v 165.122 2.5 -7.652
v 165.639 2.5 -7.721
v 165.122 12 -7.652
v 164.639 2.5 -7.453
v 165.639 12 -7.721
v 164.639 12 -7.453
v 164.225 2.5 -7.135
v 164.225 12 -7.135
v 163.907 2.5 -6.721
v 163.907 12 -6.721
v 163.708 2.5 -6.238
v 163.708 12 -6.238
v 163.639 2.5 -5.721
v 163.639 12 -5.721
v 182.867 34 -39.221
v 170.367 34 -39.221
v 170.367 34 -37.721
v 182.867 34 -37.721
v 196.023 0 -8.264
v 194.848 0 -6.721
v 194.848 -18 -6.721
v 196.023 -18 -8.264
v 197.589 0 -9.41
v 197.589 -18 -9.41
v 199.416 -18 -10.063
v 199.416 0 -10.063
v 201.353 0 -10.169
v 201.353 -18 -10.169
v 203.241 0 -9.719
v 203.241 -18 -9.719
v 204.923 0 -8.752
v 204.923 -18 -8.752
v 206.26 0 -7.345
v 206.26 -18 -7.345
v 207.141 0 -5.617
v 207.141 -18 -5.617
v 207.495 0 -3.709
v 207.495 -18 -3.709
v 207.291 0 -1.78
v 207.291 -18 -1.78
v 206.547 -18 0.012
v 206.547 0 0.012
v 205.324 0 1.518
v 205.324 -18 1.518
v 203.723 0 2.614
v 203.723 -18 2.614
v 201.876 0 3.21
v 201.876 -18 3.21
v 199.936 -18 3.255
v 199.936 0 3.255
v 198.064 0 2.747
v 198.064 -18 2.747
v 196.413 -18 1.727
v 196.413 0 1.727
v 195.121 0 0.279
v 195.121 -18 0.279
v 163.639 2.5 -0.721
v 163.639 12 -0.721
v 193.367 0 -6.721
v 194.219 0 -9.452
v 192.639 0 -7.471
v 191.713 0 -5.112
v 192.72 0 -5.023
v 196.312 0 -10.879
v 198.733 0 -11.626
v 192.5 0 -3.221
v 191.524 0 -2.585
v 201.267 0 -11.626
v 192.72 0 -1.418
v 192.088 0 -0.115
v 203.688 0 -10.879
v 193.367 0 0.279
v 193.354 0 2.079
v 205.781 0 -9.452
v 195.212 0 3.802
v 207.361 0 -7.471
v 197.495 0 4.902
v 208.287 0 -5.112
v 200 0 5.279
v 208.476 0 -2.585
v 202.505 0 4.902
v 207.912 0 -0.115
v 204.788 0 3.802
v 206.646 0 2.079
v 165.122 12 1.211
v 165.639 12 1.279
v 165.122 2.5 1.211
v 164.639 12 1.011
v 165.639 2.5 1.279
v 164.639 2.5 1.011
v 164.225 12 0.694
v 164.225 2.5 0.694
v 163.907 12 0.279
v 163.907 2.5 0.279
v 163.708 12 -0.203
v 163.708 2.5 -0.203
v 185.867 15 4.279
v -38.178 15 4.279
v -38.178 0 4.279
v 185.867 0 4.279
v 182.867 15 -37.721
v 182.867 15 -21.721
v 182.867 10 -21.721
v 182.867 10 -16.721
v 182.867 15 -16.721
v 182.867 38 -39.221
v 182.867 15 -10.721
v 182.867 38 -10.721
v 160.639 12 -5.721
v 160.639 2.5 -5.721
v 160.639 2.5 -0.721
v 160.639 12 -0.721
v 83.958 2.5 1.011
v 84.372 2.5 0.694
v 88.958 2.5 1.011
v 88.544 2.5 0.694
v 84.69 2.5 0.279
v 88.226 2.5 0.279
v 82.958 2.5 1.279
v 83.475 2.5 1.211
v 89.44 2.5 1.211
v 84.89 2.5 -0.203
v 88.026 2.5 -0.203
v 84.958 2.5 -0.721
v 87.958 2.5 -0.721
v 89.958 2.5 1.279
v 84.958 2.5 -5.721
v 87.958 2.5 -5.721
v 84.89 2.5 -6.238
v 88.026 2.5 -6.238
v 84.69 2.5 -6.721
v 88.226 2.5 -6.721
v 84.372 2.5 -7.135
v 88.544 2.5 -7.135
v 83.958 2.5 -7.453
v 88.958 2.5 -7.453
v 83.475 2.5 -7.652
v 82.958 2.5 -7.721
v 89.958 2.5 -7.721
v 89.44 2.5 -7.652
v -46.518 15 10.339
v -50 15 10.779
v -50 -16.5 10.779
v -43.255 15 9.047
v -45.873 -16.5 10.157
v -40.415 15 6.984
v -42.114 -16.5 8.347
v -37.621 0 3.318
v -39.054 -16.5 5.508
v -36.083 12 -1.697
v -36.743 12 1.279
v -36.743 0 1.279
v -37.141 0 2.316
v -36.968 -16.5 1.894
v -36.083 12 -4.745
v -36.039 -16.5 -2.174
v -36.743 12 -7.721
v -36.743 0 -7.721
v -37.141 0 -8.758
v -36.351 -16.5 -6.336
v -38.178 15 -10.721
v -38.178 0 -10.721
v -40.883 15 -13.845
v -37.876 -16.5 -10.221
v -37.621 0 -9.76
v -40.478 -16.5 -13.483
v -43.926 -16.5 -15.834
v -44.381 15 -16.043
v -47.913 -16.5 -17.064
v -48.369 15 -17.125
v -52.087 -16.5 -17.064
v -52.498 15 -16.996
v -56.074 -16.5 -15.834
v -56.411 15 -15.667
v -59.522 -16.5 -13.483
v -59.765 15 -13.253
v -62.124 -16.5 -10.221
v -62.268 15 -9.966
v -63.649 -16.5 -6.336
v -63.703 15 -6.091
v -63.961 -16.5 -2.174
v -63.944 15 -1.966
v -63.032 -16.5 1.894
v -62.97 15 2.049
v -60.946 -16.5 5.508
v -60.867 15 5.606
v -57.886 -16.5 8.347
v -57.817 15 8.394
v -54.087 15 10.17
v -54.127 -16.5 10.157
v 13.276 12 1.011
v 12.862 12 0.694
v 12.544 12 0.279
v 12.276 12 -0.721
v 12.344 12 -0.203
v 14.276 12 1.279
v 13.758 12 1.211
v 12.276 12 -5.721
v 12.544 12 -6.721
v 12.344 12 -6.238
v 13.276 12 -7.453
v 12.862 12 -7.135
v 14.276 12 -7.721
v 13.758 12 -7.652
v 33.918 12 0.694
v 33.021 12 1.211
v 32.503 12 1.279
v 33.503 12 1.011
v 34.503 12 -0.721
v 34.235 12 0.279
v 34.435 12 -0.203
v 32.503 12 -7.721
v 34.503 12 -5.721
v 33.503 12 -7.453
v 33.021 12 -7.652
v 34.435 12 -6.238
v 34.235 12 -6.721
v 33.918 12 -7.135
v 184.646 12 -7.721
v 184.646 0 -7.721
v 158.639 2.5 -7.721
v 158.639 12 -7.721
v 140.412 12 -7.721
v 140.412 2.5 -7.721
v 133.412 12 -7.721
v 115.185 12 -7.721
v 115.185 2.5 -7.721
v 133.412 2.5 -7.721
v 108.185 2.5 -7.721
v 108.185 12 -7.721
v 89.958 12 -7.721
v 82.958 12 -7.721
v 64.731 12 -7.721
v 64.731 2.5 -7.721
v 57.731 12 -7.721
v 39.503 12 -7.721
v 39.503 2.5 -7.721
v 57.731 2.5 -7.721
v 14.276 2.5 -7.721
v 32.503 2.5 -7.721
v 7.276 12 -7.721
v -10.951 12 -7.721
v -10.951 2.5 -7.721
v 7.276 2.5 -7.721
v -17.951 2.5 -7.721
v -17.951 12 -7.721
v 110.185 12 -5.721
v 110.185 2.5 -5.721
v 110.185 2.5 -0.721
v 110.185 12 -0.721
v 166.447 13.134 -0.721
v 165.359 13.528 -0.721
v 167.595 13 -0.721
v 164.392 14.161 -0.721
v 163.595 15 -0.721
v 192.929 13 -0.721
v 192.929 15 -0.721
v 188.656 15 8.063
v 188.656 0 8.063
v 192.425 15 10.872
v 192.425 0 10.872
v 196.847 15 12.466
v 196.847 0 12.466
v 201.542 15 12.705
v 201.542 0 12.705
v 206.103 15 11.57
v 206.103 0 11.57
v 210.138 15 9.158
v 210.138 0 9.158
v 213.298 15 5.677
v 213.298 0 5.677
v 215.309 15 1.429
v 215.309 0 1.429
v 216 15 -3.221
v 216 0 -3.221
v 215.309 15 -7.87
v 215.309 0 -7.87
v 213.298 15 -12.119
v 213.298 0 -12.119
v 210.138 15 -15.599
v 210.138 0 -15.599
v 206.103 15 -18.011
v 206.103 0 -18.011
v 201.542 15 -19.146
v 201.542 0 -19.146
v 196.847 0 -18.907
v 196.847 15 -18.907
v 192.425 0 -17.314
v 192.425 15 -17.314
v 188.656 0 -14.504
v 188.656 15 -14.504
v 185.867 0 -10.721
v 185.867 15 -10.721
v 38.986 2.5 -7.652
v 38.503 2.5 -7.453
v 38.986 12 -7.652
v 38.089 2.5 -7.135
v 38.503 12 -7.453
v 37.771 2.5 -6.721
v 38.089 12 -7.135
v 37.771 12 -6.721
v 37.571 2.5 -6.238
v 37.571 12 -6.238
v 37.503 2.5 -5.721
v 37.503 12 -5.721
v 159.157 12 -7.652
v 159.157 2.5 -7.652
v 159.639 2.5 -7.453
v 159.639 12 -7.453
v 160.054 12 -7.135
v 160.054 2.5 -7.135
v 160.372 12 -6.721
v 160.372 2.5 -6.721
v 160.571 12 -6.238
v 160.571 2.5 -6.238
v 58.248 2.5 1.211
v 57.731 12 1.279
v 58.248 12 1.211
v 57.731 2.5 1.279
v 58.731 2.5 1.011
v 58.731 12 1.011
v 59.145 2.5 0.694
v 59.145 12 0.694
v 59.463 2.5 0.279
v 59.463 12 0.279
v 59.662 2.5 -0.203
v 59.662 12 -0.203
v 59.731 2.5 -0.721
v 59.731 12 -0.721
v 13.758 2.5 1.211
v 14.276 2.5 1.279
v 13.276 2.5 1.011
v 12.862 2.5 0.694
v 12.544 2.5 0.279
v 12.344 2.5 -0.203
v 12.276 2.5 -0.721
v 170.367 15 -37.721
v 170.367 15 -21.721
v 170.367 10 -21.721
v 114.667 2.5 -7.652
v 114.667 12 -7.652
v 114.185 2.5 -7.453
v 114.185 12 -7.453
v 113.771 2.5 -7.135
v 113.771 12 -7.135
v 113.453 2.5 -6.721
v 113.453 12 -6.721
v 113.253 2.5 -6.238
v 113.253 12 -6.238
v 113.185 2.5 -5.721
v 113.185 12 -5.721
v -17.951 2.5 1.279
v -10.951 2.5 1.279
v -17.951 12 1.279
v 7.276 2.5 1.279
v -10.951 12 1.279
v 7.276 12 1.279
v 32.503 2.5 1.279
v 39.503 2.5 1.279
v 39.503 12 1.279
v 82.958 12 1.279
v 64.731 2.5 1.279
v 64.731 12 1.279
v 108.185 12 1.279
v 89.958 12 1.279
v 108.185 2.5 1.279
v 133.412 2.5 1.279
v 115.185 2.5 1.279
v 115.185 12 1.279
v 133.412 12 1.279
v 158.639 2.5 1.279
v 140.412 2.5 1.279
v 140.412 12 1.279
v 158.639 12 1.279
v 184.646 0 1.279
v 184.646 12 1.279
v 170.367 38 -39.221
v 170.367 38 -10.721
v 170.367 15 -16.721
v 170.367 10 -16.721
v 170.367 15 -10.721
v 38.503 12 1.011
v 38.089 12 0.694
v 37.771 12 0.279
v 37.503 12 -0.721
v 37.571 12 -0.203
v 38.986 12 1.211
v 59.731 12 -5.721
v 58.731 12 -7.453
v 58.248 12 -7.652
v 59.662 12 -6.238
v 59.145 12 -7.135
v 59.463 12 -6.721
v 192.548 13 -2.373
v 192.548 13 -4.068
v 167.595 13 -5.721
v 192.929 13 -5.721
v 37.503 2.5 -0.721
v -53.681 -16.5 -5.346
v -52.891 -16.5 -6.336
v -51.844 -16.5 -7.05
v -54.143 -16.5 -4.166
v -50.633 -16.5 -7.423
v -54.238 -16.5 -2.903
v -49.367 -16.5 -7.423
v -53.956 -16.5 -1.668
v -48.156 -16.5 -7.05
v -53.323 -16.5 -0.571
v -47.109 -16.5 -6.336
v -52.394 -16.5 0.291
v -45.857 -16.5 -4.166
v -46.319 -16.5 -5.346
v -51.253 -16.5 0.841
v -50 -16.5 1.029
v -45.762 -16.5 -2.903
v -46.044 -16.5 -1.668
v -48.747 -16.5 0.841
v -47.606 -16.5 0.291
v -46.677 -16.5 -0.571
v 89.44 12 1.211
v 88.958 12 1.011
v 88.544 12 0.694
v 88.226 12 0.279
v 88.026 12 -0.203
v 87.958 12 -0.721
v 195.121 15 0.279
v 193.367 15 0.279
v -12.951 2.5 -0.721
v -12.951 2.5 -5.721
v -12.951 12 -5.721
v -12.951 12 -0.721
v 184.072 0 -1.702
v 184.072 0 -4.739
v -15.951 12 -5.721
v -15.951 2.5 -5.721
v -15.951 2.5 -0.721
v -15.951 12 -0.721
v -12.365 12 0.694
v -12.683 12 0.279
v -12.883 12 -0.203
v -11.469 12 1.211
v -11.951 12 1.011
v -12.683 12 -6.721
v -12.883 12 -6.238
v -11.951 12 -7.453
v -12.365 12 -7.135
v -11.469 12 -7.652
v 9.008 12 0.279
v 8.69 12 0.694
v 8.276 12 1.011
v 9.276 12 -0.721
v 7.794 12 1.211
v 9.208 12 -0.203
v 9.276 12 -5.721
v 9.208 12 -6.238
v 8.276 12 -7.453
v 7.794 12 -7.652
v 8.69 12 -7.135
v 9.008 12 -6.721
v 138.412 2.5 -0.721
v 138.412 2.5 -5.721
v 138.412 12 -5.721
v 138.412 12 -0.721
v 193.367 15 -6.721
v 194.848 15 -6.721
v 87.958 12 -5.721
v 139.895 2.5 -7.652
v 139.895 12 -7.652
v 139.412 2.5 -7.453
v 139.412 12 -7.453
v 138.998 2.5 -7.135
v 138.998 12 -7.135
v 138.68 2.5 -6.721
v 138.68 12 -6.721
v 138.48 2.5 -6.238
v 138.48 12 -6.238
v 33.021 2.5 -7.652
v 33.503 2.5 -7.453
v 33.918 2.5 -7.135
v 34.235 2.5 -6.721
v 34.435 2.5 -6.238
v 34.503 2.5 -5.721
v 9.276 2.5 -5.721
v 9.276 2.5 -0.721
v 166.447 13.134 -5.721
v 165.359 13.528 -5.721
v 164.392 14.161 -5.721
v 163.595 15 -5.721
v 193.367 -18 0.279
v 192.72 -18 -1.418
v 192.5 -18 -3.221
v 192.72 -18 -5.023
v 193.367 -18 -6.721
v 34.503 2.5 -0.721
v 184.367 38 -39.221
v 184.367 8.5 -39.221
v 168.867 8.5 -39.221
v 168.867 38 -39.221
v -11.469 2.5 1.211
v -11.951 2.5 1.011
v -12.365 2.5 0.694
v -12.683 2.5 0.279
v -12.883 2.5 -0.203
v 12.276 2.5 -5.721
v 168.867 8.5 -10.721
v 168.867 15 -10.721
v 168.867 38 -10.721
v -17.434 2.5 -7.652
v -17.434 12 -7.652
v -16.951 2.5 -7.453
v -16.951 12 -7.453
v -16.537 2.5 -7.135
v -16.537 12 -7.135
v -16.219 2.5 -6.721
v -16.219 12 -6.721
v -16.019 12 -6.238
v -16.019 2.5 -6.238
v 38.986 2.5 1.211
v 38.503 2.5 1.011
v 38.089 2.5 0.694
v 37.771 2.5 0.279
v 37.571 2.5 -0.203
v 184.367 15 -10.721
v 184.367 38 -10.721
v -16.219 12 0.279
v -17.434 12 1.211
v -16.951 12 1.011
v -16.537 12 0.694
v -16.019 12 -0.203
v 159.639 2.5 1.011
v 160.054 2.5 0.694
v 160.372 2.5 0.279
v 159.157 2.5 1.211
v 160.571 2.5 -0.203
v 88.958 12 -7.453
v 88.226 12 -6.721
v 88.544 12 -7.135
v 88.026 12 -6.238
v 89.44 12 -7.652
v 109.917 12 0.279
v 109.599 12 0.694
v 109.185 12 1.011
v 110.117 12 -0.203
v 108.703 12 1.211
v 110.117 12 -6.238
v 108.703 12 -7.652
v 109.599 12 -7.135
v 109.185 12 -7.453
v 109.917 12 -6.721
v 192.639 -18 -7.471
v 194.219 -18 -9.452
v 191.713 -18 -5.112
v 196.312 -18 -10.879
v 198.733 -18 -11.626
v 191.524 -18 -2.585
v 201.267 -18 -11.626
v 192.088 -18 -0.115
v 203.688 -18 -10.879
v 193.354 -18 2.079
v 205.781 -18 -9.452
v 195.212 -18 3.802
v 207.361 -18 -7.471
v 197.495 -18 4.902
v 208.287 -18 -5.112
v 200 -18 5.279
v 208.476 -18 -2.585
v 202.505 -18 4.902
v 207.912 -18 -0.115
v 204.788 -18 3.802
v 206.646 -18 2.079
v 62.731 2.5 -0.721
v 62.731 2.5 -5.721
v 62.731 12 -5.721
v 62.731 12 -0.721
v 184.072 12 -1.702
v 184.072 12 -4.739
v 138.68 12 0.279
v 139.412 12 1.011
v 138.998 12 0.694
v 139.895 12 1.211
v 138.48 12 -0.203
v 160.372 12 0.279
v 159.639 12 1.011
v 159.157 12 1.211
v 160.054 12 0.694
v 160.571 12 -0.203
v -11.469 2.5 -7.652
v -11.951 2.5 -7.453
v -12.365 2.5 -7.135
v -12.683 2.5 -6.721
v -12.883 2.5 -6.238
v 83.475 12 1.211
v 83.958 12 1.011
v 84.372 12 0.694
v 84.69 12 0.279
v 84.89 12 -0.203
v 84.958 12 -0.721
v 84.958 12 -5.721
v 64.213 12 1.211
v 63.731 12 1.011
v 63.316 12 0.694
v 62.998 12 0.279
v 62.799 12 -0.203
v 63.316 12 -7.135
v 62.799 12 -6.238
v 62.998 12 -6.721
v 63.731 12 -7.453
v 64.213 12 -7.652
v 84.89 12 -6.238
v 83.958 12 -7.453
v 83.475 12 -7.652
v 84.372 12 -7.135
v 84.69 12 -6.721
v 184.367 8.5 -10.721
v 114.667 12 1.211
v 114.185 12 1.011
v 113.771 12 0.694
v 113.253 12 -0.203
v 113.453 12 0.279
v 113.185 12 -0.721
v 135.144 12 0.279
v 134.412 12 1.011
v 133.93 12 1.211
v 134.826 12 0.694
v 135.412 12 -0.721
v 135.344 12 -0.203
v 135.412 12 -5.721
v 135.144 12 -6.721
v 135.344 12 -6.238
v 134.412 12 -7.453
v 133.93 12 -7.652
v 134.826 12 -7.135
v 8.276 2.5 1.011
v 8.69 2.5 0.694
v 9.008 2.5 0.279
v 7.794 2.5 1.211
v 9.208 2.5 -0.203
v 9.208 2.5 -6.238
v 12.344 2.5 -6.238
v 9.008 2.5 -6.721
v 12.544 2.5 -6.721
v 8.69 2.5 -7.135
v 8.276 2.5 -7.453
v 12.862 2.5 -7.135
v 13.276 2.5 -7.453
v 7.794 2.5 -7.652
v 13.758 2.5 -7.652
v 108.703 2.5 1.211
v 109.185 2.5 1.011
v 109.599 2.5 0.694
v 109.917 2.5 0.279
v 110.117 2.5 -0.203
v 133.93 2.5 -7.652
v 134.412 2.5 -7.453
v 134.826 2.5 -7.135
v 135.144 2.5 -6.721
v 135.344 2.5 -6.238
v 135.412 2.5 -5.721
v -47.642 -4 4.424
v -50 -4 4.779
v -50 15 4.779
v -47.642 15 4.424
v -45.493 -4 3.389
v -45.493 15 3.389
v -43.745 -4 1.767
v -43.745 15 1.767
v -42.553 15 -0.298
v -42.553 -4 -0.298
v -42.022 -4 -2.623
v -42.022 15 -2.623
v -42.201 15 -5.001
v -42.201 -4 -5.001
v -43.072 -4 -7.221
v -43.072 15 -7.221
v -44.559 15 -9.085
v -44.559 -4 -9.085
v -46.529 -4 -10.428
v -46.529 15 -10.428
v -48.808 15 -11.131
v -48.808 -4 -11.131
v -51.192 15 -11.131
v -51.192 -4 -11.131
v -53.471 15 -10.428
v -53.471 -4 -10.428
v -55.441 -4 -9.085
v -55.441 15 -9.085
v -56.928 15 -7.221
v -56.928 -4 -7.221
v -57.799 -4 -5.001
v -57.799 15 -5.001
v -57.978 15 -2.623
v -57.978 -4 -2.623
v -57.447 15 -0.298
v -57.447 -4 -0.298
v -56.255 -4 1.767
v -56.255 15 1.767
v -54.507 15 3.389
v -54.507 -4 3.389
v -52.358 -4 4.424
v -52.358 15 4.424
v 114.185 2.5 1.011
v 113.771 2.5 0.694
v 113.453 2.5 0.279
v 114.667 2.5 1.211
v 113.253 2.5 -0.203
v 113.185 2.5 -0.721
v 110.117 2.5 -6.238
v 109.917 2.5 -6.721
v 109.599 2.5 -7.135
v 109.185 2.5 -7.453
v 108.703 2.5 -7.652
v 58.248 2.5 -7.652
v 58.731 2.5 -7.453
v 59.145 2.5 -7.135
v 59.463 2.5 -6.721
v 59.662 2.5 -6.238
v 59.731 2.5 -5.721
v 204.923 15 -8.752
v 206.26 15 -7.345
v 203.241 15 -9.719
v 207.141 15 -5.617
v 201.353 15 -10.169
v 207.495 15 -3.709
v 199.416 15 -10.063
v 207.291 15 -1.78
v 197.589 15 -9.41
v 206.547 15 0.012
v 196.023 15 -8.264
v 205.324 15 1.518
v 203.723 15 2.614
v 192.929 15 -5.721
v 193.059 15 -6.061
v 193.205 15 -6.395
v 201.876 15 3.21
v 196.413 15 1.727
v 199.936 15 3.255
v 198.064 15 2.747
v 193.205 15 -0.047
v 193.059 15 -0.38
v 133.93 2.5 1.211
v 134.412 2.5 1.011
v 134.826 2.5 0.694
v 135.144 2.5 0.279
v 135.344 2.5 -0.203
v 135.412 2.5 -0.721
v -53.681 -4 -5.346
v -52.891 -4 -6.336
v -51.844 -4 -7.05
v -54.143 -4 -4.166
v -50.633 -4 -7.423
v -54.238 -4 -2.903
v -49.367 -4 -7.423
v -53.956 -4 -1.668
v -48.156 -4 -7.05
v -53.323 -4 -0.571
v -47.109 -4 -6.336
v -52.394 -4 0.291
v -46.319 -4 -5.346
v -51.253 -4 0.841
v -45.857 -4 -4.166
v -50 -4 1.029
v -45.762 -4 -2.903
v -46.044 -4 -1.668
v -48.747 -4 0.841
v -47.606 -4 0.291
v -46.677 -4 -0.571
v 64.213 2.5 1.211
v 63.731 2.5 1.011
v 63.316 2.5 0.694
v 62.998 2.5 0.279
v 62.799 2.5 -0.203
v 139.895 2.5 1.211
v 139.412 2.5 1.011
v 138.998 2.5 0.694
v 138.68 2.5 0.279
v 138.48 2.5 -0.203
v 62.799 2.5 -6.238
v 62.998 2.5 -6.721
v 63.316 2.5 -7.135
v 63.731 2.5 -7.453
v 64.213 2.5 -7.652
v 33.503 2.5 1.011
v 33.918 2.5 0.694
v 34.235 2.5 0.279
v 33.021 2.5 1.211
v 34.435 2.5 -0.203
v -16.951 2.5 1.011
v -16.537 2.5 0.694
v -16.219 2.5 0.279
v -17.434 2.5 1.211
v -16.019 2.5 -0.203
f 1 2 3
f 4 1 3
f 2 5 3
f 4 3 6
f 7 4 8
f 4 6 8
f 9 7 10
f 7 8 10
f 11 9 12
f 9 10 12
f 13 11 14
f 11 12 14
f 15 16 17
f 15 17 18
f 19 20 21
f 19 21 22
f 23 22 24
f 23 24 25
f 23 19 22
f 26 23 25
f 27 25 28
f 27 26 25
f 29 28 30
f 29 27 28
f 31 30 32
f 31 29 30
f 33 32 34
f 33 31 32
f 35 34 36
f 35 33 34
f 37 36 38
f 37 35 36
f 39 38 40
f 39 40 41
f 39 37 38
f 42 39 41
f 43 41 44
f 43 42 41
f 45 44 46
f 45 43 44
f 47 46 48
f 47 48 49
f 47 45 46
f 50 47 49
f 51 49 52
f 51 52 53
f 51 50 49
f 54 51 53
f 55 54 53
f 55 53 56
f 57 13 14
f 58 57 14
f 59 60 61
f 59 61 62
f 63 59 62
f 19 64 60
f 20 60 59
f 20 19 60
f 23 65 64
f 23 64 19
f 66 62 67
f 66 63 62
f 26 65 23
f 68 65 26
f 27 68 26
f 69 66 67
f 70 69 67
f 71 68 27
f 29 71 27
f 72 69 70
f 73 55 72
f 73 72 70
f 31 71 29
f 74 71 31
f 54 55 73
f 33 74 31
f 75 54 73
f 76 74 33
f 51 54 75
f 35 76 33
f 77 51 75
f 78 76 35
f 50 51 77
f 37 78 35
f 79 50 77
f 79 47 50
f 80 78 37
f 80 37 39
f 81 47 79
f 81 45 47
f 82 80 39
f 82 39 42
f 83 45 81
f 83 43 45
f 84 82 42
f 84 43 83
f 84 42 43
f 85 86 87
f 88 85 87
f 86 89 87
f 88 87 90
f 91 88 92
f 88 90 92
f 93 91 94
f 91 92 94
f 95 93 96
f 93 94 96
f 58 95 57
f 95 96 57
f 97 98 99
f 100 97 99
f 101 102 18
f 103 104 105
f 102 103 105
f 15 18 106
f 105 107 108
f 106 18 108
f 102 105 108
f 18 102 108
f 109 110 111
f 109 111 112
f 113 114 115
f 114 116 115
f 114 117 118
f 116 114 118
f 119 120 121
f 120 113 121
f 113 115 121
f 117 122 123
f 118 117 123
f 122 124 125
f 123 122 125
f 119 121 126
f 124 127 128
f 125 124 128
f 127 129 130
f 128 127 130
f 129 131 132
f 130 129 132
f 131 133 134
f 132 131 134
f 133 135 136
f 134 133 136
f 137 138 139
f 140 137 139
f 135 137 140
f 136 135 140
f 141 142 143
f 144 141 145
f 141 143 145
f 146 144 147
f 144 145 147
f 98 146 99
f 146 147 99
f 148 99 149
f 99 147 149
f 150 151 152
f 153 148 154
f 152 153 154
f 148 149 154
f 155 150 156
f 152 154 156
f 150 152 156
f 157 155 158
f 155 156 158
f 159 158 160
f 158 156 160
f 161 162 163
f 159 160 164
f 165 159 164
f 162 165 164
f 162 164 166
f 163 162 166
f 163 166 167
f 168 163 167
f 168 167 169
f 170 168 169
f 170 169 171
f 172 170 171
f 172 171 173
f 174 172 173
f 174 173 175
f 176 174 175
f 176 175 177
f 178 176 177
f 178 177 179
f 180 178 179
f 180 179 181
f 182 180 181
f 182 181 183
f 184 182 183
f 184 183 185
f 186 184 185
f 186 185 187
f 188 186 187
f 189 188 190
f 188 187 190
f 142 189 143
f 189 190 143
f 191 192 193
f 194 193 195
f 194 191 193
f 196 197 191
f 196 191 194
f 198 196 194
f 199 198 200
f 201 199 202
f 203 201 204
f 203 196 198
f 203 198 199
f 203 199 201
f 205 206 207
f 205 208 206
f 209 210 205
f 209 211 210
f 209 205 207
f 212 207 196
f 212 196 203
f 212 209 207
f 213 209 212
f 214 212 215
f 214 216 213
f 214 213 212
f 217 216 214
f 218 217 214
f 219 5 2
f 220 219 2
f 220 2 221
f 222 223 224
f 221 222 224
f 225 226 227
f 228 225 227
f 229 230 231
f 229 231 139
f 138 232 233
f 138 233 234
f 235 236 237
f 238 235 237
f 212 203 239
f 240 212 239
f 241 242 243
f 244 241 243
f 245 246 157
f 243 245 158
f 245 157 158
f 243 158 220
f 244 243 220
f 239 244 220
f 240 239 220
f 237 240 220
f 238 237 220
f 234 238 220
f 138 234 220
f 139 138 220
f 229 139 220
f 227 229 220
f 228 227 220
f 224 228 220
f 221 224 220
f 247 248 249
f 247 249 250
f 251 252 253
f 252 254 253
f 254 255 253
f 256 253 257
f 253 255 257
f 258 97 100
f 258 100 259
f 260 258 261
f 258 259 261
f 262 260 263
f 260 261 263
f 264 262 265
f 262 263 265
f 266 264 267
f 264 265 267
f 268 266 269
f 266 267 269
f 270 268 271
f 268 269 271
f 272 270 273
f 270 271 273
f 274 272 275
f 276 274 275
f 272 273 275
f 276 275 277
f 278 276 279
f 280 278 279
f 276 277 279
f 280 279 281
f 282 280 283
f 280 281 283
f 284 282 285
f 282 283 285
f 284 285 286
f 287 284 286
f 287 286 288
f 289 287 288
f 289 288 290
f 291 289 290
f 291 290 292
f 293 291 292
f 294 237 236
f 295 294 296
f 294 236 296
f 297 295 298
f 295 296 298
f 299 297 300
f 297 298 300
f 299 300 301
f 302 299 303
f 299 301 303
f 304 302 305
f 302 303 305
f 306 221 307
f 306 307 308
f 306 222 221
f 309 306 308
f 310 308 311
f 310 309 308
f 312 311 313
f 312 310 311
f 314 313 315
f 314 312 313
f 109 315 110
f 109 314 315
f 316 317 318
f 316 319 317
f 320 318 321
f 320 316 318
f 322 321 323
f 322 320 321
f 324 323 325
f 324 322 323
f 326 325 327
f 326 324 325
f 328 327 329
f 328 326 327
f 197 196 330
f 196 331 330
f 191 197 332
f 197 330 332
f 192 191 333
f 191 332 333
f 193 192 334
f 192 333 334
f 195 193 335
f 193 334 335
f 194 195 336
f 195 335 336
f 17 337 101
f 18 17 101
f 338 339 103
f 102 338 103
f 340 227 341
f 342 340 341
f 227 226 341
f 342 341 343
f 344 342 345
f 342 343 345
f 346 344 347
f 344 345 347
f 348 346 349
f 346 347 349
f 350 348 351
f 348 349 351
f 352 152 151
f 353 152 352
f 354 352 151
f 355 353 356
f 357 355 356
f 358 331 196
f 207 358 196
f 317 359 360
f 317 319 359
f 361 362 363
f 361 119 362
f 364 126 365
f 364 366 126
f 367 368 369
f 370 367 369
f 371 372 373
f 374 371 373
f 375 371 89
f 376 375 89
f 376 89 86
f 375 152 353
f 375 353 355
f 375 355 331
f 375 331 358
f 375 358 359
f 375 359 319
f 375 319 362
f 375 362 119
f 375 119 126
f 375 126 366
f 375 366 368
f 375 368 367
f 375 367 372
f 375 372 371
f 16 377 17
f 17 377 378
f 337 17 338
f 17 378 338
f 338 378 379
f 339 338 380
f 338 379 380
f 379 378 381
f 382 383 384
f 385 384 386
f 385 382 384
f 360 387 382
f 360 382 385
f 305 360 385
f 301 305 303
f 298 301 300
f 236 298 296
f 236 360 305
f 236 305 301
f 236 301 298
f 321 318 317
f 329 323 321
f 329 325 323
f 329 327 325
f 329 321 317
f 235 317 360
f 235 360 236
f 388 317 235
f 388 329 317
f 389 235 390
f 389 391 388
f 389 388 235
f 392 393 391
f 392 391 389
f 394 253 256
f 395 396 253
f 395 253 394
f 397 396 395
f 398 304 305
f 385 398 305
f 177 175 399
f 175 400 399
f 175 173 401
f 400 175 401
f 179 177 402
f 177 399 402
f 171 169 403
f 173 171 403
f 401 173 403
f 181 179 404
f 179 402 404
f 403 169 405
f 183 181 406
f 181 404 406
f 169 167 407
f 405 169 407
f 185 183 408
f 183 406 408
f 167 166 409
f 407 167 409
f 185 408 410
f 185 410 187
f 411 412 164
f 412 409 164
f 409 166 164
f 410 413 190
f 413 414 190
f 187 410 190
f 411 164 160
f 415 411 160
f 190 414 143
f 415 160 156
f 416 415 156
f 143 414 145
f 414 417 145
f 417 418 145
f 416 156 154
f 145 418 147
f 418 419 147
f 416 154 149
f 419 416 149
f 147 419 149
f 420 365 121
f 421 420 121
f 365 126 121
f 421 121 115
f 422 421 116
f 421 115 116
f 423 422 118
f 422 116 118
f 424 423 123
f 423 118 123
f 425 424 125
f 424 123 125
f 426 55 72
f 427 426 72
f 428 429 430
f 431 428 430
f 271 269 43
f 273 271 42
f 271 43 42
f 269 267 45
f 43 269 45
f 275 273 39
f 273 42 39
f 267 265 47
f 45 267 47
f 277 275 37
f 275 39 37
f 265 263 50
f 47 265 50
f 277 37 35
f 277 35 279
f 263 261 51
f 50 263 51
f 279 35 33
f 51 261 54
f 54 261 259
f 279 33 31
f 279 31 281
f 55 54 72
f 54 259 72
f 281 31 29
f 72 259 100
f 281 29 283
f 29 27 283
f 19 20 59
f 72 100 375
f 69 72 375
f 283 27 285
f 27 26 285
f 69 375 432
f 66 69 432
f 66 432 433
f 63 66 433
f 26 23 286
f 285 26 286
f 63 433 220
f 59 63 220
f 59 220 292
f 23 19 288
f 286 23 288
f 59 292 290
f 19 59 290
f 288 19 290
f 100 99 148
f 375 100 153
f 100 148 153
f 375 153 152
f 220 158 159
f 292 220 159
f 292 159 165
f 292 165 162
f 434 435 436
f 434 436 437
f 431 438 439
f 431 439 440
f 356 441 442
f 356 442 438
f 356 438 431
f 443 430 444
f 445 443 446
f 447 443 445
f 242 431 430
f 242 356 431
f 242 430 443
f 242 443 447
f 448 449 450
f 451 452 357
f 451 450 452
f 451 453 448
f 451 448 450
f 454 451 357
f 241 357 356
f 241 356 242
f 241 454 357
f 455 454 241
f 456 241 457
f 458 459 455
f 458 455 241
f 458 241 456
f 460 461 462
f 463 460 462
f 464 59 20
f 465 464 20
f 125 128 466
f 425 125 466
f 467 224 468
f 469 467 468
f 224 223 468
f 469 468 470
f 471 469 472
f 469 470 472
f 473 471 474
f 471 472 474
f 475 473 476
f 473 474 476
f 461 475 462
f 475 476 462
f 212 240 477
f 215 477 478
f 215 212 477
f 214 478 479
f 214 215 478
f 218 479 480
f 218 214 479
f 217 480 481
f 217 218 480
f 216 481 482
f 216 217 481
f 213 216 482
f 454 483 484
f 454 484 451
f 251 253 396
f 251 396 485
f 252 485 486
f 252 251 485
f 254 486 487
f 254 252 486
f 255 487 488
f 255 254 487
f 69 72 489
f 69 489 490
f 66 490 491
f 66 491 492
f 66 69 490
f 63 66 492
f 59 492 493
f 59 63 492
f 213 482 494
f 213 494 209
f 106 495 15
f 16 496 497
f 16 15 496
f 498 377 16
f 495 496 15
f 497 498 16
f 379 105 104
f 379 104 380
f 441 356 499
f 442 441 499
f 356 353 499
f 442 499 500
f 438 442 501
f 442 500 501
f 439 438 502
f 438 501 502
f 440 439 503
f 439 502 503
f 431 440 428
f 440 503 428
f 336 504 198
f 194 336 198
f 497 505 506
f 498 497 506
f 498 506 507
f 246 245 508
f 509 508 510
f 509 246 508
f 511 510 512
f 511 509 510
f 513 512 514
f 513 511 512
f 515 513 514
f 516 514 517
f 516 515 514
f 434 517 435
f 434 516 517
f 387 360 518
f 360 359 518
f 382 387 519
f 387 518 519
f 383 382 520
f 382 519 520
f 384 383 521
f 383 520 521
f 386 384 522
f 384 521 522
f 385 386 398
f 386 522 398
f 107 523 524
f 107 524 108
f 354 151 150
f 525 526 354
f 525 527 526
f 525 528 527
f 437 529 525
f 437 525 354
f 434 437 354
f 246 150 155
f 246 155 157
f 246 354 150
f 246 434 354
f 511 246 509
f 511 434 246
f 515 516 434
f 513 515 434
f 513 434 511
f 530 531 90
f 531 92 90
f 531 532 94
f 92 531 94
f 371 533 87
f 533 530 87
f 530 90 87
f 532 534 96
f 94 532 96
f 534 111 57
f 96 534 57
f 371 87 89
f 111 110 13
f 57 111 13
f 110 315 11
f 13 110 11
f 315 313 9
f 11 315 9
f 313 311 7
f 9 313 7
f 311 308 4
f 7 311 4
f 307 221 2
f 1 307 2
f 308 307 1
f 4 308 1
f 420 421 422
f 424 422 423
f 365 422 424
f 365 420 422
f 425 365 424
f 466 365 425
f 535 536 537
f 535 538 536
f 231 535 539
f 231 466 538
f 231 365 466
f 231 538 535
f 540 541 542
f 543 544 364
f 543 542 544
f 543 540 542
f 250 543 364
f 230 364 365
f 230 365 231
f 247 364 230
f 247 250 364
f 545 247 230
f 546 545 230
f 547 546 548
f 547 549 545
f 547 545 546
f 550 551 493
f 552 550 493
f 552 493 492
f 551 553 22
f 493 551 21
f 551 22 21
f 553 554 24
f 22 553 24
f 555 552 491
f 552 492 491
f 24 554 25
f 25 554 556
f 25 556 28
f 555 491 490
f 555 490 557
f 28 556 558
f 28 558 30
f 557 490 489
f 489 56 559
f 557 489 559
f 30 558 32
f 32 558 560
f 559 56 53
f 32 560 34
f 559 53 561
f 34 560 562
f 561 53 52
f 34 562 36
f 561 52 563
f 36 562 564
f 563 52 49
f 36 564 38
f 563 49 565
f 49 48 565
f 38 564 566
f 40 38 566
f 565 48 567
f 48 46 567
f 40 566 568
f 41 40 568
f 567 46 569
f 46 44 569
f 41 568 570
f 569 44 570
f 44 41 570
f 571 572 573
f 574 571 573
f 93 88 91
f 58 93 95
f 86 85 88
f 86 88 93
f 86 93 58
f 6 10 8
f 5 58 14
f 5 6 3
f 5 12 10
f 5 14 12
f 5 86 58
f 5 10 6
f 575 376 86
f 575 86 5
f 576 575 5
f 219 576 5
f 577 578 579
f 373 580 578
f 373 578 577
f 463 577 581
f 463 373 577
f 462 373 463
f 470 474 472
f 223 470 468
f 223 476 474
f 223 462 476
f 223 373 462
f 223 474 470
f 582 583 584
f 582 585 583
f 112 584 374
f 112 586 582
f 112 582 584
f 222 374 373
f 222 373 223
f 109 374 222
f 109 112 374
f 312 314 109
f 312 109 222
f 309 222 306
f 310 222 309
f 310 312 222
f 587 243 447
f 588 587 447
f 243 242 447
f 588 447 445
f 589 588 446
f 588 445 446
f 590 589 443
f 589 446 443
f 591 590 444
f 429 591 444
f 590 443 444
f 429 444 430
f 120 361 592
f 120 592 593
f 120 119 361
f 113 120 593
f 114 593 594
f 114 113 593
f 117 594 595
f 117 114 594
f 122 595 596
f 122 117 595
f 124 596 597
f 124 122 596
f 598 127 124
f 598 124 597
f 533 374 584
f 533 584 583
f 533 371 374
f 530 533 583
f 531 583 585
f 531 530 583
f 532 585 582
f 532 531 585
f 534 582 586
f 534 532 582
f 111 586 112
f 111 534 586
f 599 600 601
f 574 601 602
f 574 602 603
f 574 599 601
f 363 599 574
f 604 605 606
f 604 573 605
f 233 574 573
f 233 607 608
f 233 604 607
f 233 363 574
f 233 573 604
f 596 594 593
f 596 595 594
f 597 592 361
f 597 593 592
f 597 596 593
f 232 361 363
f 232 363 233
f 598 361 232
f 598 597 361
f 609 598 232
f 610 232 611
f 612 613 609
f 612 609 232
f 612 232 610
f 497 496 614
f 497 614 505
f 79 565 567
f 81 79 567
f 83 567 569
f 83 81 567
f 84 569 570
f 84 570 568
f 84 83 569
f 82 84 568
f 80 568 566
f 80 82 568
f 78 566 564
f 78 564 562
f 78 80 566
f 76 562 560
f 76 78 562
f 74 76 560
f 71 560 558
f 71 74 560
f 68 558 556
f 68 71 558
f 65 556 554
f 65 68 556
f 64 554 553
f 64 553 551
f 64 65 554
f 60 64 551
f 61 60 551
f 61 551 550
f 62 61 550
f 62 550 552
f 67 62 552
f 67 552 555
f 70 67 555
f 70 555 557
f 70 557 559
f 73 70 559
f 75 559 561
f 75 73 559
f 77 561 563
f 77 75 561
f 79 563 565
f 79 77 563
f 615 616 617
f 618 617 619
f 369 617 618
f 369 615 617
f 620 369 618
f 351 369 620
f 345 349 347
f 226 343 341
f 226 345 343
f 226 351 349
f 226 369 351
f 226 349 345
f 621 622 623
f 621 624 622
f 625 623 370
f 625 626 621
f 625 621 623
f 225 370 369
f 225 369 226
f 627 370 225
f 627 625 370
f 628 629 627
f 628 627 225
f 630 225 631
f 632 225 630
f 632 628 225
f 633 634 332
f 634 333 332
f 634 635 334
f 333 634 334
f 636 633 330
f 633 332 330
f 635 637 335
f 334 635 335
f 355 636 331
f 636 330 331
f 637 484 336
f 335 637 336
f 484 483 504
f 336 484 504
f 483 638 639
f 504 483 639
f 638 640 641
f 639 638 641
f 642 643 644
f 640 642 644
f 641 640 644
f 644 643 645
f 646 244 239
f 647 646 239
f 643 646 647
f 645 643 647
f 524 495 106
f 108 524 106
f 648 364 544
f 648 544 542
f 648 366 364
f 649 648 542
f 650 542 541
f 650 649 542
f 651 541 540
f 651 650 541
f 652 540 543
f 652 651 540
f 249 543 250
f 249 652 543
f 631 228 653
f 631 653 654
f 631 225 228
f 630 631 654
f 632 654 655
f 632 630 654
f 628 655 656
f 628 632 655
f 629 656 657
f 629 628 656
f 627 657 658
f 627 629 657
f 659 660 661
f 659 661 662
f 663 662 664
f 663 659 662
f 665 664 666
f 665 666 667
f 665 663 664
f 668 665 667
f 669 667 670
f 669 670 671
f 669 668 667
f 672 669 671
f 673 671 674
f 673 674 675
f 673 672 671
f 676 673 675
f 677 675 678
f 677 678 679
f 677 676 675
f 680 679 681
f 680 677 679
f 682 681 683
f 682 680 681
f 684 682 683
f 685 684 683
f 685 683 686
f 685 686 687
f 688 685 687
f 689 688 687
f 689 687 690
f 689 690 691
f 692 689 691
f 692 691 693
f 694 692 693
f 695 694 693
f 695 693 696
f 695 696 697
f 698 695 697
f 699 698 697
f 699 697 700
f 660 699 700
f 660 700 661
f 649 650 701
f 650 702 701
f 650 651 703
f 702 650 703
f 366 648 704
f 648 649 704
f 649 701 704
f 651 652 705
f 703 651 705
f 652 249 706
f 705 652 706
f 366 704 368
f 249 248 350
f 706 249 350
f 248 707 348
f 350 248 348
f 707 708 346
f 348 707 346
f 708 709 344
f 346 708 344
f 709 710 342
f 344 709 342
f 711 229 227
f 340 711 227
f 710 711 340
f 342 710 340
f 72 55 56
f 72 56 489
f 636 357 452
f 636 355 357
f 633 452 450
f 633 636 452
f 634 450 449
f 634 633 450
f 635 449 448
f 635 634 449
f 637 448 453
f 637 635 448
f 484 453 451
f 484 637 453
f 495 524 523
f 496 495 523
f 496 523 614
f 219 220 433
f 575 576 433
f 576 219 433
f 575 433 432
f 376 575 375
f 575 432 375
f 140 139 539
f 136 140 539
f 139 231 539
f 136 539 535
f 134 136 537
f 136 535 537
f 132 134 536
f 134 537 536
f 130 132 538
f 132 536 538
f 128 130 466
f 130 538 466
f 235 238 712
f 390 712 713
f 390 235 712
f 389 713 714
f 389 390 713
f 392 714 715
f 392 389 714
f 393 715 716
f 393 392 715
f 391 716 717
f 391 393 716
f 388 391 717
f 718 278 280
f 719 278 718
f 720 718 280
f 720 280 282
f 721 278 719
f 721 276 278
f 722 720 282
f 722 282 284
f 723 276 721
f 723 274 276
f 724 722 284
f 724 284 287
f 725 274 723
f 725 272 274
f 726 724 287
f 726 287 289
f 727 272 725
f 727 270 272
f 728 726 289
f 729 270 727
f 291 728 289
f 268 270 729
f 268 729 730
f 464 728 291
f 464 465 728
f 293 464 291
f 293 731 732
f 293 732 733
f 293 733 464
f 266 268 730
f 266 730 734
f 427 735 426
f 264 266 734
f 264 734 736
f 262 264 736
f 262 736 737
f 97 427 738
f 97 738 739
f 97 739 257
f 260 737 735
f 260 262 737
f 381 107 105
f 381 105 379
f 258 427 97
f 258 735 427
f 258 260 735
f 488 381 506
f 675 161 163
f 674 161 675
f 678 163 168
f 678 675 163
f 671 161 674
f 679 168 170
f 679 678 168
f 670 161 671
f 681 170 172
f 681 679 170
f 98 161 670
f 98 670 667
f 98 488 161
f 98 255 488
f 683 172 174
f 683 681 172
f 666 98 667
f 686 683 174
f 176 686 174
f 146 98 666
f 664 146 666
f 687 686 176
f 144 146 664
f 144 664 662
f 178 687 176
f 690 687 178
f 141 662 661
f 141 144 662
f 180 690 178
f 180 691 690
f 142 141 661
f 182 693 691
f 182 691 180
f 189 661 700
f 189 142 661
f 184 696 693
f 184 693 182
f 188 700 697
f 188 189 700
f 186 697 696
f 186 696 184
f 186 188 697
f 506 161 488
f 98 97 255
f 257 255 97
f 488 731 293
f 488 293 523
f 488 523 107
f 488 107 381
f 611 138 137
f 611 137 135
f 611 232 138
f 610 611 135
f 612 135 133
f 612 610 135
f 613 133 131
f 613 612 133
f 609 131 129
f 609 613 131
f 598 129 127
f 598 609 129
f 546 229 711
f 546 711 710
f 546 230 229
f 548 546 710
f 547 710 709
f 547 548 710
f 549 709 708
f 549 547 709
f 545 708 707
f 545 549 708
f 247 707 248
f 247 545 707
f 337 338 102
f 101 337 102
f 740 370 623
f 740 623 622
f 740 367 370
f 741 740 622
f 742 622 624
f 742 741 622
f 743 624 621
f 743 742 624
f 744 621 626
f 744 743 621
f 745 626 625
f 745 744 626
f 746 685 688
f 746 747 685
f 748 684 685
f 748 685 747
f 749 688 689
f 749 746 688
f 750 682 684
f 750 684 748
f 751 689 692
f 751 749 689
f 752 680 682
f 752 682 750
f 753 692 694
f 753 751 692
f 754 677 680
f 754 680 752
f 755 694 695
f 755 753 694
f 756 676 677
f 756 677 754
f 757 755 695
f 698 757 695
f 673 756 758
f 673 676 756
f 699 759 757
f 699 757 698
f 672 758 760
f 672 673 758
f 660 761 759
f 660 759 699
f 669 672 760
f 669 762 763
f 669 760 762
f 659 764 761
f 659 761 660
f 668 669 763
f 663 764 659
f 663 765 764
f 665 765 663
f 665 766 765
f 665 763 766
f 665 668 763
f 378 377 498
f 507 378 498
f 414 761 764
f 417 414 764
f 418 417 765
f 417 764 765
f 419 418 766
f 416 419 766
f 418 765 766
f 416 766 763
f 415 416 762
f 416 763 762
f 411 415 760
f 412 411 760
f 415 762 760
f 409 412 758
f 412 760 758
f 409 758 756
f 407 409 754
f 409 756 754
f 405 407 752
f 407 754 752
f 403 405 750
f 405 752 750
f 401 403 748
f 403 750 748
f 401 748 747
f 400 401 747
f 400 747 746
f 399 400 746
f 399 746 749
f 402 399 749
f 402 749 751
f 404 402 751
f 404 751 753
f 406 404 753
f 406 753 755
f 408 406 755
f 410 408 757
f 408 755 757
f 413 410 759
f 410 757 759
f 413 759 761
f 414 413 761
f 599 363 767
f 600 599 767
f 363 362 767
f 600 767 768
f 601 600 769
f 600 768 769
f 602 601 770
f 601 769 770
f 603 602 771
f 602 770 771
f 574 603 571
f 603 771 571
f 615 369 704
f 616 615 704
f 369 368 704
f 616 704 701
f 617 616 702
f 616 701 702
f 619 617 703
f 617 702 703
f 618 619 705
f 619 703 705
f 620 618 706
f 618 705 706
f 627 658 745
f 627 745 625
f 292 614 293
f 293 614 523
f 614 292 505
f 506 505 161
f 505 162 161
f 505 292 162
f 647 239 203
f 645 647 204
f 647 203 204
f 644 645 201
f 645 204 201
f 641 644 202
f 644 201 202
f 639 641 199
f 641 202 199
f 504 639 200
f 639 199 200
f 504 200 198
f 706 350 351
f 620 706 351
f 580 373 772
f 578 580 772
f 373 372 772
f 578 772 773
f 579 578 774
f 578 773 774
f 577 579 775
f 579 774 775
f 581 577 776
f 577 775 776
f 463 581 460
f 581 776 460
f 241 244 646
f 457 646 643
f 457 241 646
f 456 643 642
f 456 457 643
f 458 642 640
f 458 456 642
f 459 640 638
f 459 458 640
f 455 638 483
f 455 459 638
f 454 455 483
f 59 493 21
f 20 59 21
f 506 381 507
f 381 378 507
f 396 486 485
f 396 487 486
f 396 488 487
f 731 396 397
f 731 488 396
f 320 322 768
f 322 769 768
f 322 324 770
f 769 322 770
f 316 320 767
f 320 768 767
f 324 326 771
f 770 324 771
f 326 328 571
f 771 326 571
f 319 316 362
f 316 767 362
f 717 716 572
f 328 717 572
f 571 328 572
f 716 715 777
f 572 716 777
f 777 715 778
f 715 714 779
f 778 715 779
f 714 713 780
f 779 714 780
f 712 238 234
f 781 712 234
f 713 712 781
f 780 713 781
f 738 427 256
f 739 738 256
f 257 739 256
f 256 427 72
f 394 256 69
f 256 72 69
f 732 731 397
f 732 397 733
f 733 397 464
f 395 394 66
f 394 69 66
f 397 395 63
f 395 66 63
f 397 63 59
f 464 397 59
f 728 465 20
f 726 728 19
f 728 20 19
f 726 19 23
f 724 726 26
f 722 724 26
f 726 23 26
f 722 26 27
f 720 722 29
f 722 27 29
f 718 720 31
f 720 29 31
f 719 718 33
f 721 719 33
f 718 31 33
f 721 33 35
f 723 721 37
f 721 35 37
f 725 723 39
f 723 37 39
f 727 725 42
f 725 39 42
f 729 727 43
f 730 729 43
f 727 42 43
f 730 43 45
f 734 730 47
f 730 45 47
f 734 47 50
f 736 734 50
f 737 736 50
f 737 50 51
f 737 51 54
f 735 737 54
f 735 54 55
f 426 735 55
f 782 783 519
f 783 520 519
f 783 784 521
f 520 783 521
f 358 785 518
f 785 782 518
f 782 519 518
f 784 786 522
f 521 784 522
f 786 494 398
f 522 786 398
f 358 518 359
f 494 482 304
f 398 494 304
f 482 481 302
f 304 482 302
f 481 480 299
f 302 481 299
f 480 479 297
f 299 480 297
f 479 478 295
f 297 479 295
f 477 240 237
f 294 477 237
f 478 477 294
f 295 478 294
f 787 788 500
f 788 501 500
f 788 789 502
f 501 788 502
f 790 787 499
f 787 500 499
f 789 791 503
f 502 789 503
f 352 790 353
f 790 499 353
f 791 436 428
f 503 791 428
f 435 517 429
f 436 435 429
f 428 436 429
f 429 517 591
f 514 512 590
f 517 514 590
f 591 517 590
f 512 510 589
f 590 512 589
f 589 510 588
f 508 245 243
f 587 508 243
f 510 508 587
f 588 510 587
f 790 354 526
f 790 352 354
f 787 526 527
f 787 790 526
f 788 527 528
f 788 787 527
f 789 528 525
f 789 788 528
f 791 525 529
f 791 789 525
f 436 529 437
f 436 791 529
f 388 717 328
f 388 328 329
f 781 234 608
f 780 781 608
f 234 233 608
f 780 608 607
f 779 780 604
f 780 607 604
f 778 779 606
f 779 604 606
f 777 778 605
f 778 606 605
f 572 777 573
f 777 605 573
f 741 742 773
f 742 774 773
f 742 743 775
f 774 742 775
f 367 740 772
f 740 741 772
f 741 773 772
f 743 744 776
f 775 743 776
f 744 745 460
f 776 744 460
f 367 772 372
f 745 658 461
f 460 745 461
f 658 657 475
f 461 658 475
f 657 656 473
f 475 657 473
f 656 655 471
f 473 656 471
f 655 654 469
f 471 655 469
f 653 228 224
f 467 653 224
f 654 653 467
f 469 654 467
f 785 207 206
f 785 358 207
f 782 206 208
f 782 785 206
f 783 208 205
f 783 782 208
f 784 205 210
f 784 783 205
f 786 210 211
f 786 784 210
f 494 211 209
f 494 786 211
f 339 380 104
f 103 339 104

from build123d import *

# Parameters (mm, degrees)
BOSS_EXTRUDE7_DEPTH                   = 15
BOSS_EXTRUDE7_DEPTH_BACK              = 16.5
SKETCH2_R                             = 14
SKETCH2_R_2                           = 8
SKETCH2_9_R                           = 16
BOSS_EXTRUDE8_DEPTH                   = 15
BOSS_EXTRUDE11_REACH                  = 219.48
BOSS_EXTRUDE11_END_RADIUS             = 14
BOSS_EXTRUDE11_DIRECTION_2_REACH      = 219.48
BOSS_EXTRUDE11_DIRECTION_2_END_RADIUS = 16
BOSS_EXTRUDE12_REACH                  = 219.597
SKETCH15_W                            = 3
SKETCH15_H                            = 9.5
FILLET1_R                             = 2
BOSS_EXTRUDE13_START                  = -4
SKETCH2_13_R                          = 8
SKETCH2_13_R_2                        = 4.25
BOSS_EXTRUDE13_DEPTH                  = 12.5
SKETCH2_14_R                          = 8.5
BOSS_EXTRUDE14_DEPTH                  = 18
SKETCH16_W                            = 30
SKETCH16_H                            = 5
CUT_EXTRUDE1_DEPTH                    = 2
FILLET2_R                             = 5
SKETCH18_W                            = 1.5
SKETCH18_H                            = 23
BOSS_EXTRUDE15_DEPTH                  = 28.5
SKETCH18_3_W                          = 12.5
SKETCH18_3_H                          = 5
BOSS_EXTRUDE16_DEPTH                  = 6
SKETCH19_W                            = 12.5
SKETCH19_H                            = 1.5
BOSS_EXTRUDE17_DEPTH                  = 24
SKETCH20_W                            = 12.5
SKETCH20_H                            = 16
BOSS_EXTRUDE18_DEPTH                  = 5


with BuildPart() as part:
    # Sketch2 → Boss-Extrude7 (new, two sides: drawn at the far end of the back side and taken through both)
    with BuildSketch(Plane(origin=(0, 0, 0), x_dir=(1, 0, 0), z_dir=(0, 1, 0)).offset(-BOSS_EXTRUDE7_DEPTH_BACK)):
        with Locations(Location((-50, 3.220631283, 0), (0, 0, 270))):
            Circle(SKETCH2_R)
        with Locations(Location((-50, 3.220631283, 0), (0, 0, 270))):
            Circle(SKETCH2_R_2, mode=Mode.SUBTRACT)
    extrude(amount=BOSS_EXTRUDE7_DEPTH + BOSS_EXTRUDE7_DEPTH_BACK)


with BuildPart() as body_2:
    # Sketch2<9> → Boss-Extrude8 (new body)
    with BuildSketch(Plane(origin=(0, 0, 0), x_dir=(1, 0, 0), z_dir=(0, 1, 0))):
        with Locations(Location((200, 3.22063128, 0), (0, 0, 270))):
            Circle(SKETCH2_9_R)
        with BuildLine():
            Line((193.366750419, 6.72063128), (194.847605266, 6.72063128))
            ThreePointArc((194.847605266, 6.72063128), (207.494856499, 3.709302606), (195.121030689, -0.27936872))
            Line((195.121030689, -0.27936872), (193.366750419, -0.27936872))
            ThreePointArc((193.366750419, -0.27936872), (192.5, 3.22063128), (193.366750419, 6.72063128))
        make_face(mode=Mode.SUBTRACT)
    extrude(amount=BOSS_EXTRUDE8_DEPTH)


    add(part.part)  # Boss-Extrude11 merges part
    # Boss-Extrude11: up to this cylinder (the profile starts outside it)
    boss_extrude11_end = Plane(origin=(-50, 6, -3.220631283), z_dir=(0, 1, 0)) * Cylinder(BOSS_EXTRUDE11_END_RADIUS, 467.96, mode=Mode.PRIVATE)
    # Sketch3 → Boss-Extrude11 (add, up to the surface)
    with BuildSketch(Plane(origin=(0, 0, 0), x_dir=(0, 0, -1), z_dir=(1, 0, 0)), mode=Mode.PRIVATE) as boss_extrude11_sk1:
        Polygon((10.720631283, 0), (10.720631283, 15), (-4.279368717, 15), (-4.279368717, 0), (-1.279368717, 0), (-1.279368717, 12), (7.720631283, 12), (7.720631283, 0), align=None)
    boss_extrude11_tool1 = extrude(boss_extrude11_sk1.sketch, amount=-BOSS_EXTRUDE11_REACH, mode=Mode.PRIVATE) - boss_extrude11_end
    add(boss_extrude11_tool1.solids().sort_by_distance((0, 6, 1.491501))[0])

    # Boss-Extrude11 direction 2: up to this cylinder (the profile starts outside it)
    boss_extrude11_direction_2_end = Plane(origin=(200, 6, -3.22063128), z_dir=(0, -1, 0)) * Cylinder(BOSS_EXTRUDE11_DIRECTION_2_END_RADIUS, 471.96, mode=Mode.PRIVATE)
    # Sketch3 → Boss-Extrude11 direction 2 (add, up to the surface)
    with BuildSketch(Plane(origin=(0, 0, 0), x_dir=(0, 0, -1), z_dir=(1, 0, 0)), mode=Mode.PRIVATE) as boss_extrude11_direction_2_sk1:
        Polygon((10.720631283, 0), (10.720631283, 15), (-4.279368717, 15), (-4.279368717, 0), (-1.279368717, 0), (-1.279368717, 12), (7.720631283, 12), (7.720631283, 0), align=None)
    boss_extrude11_direction_2_tool1 = extrude(boss_extrude11_direction_2_sk1.sketch, amount=BOSS_EXTRUDE11_DIRECTION_2_REACH, mode=Mode.PRIVATE) - boss_extrude11_direction_2_end
    add(boss_extrude11_direction_2_tool1.solids().sort_by_distance((0, 6, 1.491501))[0])

    # Sketch15 → Boss-Extrude12 (add, up to next)
    with BuildSketch(Plane.XY.offset(-7.720631283), mode=Mode.PRIVATE) as boss_extrude12_sk1:
        with Locations((-14.45117452, 7.25)):
            Rectangle(SKETCH15_W, SKETCH15_H)
    boss_extrude12_tool1 = extrude(boss_extrude12_sk1.sketch, amount=BOSS_EXTRUDE12_REACH, mode=Mode.PRIVATE) - body_2.part
    # Sketch15 → Boss-Extrude12 (add, up to next)
    with BuildSketch(Plane.XY.offset(-7.720631283), mode=Mode.PRIVATE) as boss_extrude12_sk2:
        with Locations((86.457765729, 7.25)):
            Rectangle(SKETCH15_W, SKETCH15_H)
    boss_extrude12_tool2 = extrude(boss_extrude12_sk2.sketch, amount=BOSS_EXTRUDE12_REACH, mode=Mode.PRIVATE) - body_2.part
    # Sketch15 → Boss-Extrude12 (add, up to next)
    with BuildSketch(Plane.XY.offset(-7.720631283), mode=Mode.PRIVATE) as boss_extrude12_sk3:
        with Locations((10.776060542, 7.25)):
            Rectangle(SKETCH15_W, SKETCH15_H)
    boss_extrude12_tool3 = extrude(boss_extrude12_sk3.sketch, amount=BOSS_EXTRUDE12_REACH, mode=Mode.PRIVATE) - body_2.part
    # Sketch15 → Boss-Extrude12 (add, up to next)
    with BuildSketch(Plane.XY.offset(-7.720631283), mode=Mode.PRIVATE) as boss_extrude12_sk4:
        with Locations((36.003295604, 7.25)):
            Rectangle(SKETCH15_W, SKETCH15_H)
    boss_extrude12_tool4 = extrude(boss_extrude12_sk4.sketch, amount=BOSS_EXTRUDE12_REACH, mode=Mode.PRIVATE) - body_2.part
    # Sketch15 → Boss-Extrude12 (add, up to next)
    with BuildSketch(Plane.XY.offset(-7.720631283), mode=Mode.PRIVATE) as boss_extrude12_sk5:
        with Locations((61.230530666, 7.25)):
            Rectangle(SKETCH15_W, SKETCH15_H)
    boss_extrude12_tool5 = extrude(boss_extrude12_sk5.sketch, amount=BOSS_EXTRUDE12_REACH, mode=Mode.PRIVATE) - body_2.part
    # Sketch15 → Boss-Extrude12 (add, up to next)
    with BuildSketch(Plane.XY.offset(-7.720631283), mode=Mode.PRIVATE) as boss_extrude12_sk6:
        with Locations((111.685000791, 7.25)):
            Rectangle(SKETCH15_W, SKETCH15_H)
    boss_extrude12_tool6 = extrude(boss_extrude12_sk6.sketch, amount=BOSS_EXTRUDE12_REACH, mode=Mode.PRIVATE) - body_2.part
    # Sketch15 → Boss-Extrude12 (add, up to next)
    with BuildSketch(Plane.XY.offset(-7.720631283), mode=Mode.PRIVATE) as boss_extrude12_sk7:
        with Locations((136.912235853, 7.25)):
            Rectangle(SKETCH15_W, SKETCH15_H)
    boss_extrude12_tool7 = extrude(boss_extrude12_sk7.sketch, amount=BOSS_EXTRUDE12_REACH, mode=Mode.PRIVATE) - body_2.part
    # Sketch15 → Boss-Extrude12 (add, up to next)
    with BuildSketch(Plane.XY.offset(-7.720631283), mode=Mode.PRIVATE) as boss_extrude12_sk8:
        with Locations((162.139470915, 7.25)):
            Rectangle(SKETCH15_W, SKETCH15_H)
    boss_extrude12_tool8 = extrude(boss_extrude12_sk8.sketch, amount=BOSS_EXTRUDE12_REACH, mode=Mode.PRIVATE) - body_2.part
    add(boss_extrude12_tool1.solids().sort_by_distance((-14.451175, 7.25, -7.720631))[0])
    add(boss_extrude12_tool2.solids().sort_by_distance((86.457766, 7.25, -7.720631))[0])
    add(boss_extrude12_tool3.solids().sort_by_distance((10.776061, 7.25, -7.720631))[0])
    add(boss_extrude12_tool4.solids().sort_by_distance((36.003296, 7.25, -7.720631))[0])
    add(boss_extrude12_tool5.solids().sort_by_distance((61.230531, 7.25, -7.720631))[0])
    add(boss_extrude12_tool6.solids().sort_by_distance((111.685001, 7.25, -7.720631))[0])
    add(boss_extrude12_tool7.solids().sort_by_distance((136.912236, 7.25, -7.720631))[0])
    add(boss_extrude12_tool8.solids().sort_by_distance((162.139471, 7.25, -7.720631))[0])

    # Fillet1
    fillet1_edges = [body_2.edges().sort_by_distance(p)[0] for p in [
        (59.730530666, 7.25, 1.279368717),
        (62.730530666, 7.25, 1.279368717),
        (62.730530666, 7.25, -7.720631283),
        (59.730530666, 7.25, -7.720631283),
        (110.185000791, 7.25, 1.279368717),
        (113.185000791, 7.25, 1.279368717),
        (113.185000791, 7.25, -7.720631283),
        (110.185000791, 7.25, -7.720631283),
        (135.412235853, 7.25, 1.279368717),
        (138.412235853, 7.25, 1.279368717),
        (138.412235853, 7.25, -7.720631283),
        (135.412235853, 7.25, -7.720631283),
        (160.639470915, 7.25, 1.279368717),
        (163.639470915, 7.25, 1.279368717),
        (163.639470915, 7.25, -7.720631283),
        (160.639470915, 7.25, -7.720631283),
        (-15.95117452, 7.25, 1.279368717),
        (-12.95117452, 7.25, 1.279368717),
        (-12.95117452, 7.25, -7.720631283),
        (-15.95117452, 7.25, -7.720631283),
        (84.957765729, 7.25, 1.279368717),
        (87.957765729, 7.25, 1.279368717),
        (87.957765729, 7.25, -7.720631283),
        (84.957765729, 7.25, -7.720631283),
        (12.276060542, 7.25, 1.279368717),
        (9.276060542, 7.25, 1.279368717),
        (12.276060542, 7.25, -7.720631283),
        (9.276060542, 7.25, -7.720631283),
        (34.503295604, 7.25, 1.279368717),
        (37.503295604, 7.25, 1.279368717),
        (37.503295604, 7.25, -7.720631283),
        (34.503295604, 7.25, -7.720631283),
    ]]
    fillet(fillet1_edges, radius=FILLET1_R)

    # Sketch2<13> → Boss-Extrude13 (add, through all)
    with BuildSketch(Plane(origin=(0, 0, 0), x_dir=(1, 0, 0), z_dir=(0, 1, 0)).offset(BOSS_EXTRUDE13_START)):
        with Locations(Location((-50, 3.220631283, 0), (0, 0, 270))):
            Circle(SKETCH2_13_R)
        with Locations(Location((-50, 3.220631283, 0), (0, 0, 270))):
            Circle(SKETCH2_13_R_2, mode=Mode.SUBTRACT)
    extrude(amount=-BOSS_EXTRUDE13_DEPTH)

    # Sketch16 → Cut-Extrude1 (cut)
    with BuildSketch(Plane(origin=(0, 15, 0), x_dir=(1, 0, 0), z_dir=(0, 1, 0))):
        with Locations((178.595378821, 3.22063128)):
            Rectangle(SKETCH16_W, SKETCH16_H)
    extrude(amount=-CUT_EXTRUDE1_DEPTH, mode=Mode.SUBTRACT)

    # Fillet2
    # the kernel refuses this fillet: 5 mm, written as the material it adds along each edge
    with BuildSketch(Plane(origin=(163.595378821, 13, -0.72063128), x_dir=(0, 1, 0), z_dir=(0, 0, -1))) as fillet2_piece_1:
        with BuildLine():
            CenterArc((5, 4), FILLET2_R, 180, 53.130102354)
            Line((0, 4), (0, 0))
            Line((0, 0), (2, 0))
        make_face()
    extrude(amount=5)

    # Sketch18 → Boss-Extrude15 (add)
    with BuildSketch(Plane(origin=(0, 0, -10.720631283), x_dir=(-1, 0, 0), z_dir=(0, 0, -1))):
        with Locations((-183.616705977, 26.5)):
            Rectangle(SKETCH18_W, SKETCH18_H)
        Polygon((-184.366705977, 15), (-184.366705977, 8.5), (-168.866705977, 8.5), (-168.866705977, 15), (-170.366705977, 15), (-170.366705977, 10), (-182.866705977, 10), (-182.866705977, 15), align=None)
        with Locations((-169.616705977, 26.5)):
            Rectangle(SKETCH18_W, SKETCH18_H)
    extrude(amount=BOSS_EXTRUDE15_DEPTH)

    # Sketch18<3> → Boss-Extrude16 (add)
    with BuildSketch(Plane(origin=(0, 0, -10.720631283), x_dir=(-1, 0, 0), z_dir=(0, 0, -1))):
        with Locations((-176.616705977, 12.5)):
            Rectangle(SKETCH18_3_W, SKETCH18_3_H)
    extrude(amount=BOSS_EXTRUDE16_DEPTH)

    # Sketch19 → Boss-Extrude17 (add)
    with BuildSketch(Plane(origin=(0, 10, 0), x_dir=(1, 0, 0), z_dir=(0, 1, 0))):
        with Locations((176.616705977, 38.470631283)):
            Rectangle(SKETCH19_W, SKETCH19_H)
    extrude(amount=BOSS_EXTRUDE17_DEPTH)

    # Sketch20 → Boss-Extrude18 (add)
    with BuildSketch(Plane(origin=(0, 10, 0), x_dir=(1, 0, 0), z_dir=(0, 1, 0))):
        with Locations((176.616705977, 29.720631283)):
            Rectangle(SKETCH20_W, SKETCH20_H)
    extrude(amount=BOSS_EXTRUDE18_DEPTH)


with BuildPart() as body_2_2:
    # Sketch2<14> → Boss-Extrude14 (new body)
    with BuildSketch(Plane(origin=(0, 0, 0), x_dir=(1, 0, 0), z_dir=(0, 1, 0))):
        with Locations(Location((200, 3.22063128, 0), (0, 0, 270))):
            Circle(SKETCH2_14_R)
        with BuildLine():
            Line((193.366750419, 6.72063128), (194.847605266, 6.72063128))
            ThreePointArc((194.847605266, 6.72063128), (207.494856499, 3.709302606), (195.121030689, -0.27936872))
            Line((195.121030689, -0.27936872), (193.366750419, -0.27936872))
            ThreePointArc((193.366750419, -0.27936872), (192.5, 3.22063128), (193.366750419, 6.72063128))
        make_face(mode=Mode.SUBTRACT)
    extrude(amount=-BOSS_EXTRUDE14_DEPTH)


solid = Compound([body_2.part, body_2_2.part])
